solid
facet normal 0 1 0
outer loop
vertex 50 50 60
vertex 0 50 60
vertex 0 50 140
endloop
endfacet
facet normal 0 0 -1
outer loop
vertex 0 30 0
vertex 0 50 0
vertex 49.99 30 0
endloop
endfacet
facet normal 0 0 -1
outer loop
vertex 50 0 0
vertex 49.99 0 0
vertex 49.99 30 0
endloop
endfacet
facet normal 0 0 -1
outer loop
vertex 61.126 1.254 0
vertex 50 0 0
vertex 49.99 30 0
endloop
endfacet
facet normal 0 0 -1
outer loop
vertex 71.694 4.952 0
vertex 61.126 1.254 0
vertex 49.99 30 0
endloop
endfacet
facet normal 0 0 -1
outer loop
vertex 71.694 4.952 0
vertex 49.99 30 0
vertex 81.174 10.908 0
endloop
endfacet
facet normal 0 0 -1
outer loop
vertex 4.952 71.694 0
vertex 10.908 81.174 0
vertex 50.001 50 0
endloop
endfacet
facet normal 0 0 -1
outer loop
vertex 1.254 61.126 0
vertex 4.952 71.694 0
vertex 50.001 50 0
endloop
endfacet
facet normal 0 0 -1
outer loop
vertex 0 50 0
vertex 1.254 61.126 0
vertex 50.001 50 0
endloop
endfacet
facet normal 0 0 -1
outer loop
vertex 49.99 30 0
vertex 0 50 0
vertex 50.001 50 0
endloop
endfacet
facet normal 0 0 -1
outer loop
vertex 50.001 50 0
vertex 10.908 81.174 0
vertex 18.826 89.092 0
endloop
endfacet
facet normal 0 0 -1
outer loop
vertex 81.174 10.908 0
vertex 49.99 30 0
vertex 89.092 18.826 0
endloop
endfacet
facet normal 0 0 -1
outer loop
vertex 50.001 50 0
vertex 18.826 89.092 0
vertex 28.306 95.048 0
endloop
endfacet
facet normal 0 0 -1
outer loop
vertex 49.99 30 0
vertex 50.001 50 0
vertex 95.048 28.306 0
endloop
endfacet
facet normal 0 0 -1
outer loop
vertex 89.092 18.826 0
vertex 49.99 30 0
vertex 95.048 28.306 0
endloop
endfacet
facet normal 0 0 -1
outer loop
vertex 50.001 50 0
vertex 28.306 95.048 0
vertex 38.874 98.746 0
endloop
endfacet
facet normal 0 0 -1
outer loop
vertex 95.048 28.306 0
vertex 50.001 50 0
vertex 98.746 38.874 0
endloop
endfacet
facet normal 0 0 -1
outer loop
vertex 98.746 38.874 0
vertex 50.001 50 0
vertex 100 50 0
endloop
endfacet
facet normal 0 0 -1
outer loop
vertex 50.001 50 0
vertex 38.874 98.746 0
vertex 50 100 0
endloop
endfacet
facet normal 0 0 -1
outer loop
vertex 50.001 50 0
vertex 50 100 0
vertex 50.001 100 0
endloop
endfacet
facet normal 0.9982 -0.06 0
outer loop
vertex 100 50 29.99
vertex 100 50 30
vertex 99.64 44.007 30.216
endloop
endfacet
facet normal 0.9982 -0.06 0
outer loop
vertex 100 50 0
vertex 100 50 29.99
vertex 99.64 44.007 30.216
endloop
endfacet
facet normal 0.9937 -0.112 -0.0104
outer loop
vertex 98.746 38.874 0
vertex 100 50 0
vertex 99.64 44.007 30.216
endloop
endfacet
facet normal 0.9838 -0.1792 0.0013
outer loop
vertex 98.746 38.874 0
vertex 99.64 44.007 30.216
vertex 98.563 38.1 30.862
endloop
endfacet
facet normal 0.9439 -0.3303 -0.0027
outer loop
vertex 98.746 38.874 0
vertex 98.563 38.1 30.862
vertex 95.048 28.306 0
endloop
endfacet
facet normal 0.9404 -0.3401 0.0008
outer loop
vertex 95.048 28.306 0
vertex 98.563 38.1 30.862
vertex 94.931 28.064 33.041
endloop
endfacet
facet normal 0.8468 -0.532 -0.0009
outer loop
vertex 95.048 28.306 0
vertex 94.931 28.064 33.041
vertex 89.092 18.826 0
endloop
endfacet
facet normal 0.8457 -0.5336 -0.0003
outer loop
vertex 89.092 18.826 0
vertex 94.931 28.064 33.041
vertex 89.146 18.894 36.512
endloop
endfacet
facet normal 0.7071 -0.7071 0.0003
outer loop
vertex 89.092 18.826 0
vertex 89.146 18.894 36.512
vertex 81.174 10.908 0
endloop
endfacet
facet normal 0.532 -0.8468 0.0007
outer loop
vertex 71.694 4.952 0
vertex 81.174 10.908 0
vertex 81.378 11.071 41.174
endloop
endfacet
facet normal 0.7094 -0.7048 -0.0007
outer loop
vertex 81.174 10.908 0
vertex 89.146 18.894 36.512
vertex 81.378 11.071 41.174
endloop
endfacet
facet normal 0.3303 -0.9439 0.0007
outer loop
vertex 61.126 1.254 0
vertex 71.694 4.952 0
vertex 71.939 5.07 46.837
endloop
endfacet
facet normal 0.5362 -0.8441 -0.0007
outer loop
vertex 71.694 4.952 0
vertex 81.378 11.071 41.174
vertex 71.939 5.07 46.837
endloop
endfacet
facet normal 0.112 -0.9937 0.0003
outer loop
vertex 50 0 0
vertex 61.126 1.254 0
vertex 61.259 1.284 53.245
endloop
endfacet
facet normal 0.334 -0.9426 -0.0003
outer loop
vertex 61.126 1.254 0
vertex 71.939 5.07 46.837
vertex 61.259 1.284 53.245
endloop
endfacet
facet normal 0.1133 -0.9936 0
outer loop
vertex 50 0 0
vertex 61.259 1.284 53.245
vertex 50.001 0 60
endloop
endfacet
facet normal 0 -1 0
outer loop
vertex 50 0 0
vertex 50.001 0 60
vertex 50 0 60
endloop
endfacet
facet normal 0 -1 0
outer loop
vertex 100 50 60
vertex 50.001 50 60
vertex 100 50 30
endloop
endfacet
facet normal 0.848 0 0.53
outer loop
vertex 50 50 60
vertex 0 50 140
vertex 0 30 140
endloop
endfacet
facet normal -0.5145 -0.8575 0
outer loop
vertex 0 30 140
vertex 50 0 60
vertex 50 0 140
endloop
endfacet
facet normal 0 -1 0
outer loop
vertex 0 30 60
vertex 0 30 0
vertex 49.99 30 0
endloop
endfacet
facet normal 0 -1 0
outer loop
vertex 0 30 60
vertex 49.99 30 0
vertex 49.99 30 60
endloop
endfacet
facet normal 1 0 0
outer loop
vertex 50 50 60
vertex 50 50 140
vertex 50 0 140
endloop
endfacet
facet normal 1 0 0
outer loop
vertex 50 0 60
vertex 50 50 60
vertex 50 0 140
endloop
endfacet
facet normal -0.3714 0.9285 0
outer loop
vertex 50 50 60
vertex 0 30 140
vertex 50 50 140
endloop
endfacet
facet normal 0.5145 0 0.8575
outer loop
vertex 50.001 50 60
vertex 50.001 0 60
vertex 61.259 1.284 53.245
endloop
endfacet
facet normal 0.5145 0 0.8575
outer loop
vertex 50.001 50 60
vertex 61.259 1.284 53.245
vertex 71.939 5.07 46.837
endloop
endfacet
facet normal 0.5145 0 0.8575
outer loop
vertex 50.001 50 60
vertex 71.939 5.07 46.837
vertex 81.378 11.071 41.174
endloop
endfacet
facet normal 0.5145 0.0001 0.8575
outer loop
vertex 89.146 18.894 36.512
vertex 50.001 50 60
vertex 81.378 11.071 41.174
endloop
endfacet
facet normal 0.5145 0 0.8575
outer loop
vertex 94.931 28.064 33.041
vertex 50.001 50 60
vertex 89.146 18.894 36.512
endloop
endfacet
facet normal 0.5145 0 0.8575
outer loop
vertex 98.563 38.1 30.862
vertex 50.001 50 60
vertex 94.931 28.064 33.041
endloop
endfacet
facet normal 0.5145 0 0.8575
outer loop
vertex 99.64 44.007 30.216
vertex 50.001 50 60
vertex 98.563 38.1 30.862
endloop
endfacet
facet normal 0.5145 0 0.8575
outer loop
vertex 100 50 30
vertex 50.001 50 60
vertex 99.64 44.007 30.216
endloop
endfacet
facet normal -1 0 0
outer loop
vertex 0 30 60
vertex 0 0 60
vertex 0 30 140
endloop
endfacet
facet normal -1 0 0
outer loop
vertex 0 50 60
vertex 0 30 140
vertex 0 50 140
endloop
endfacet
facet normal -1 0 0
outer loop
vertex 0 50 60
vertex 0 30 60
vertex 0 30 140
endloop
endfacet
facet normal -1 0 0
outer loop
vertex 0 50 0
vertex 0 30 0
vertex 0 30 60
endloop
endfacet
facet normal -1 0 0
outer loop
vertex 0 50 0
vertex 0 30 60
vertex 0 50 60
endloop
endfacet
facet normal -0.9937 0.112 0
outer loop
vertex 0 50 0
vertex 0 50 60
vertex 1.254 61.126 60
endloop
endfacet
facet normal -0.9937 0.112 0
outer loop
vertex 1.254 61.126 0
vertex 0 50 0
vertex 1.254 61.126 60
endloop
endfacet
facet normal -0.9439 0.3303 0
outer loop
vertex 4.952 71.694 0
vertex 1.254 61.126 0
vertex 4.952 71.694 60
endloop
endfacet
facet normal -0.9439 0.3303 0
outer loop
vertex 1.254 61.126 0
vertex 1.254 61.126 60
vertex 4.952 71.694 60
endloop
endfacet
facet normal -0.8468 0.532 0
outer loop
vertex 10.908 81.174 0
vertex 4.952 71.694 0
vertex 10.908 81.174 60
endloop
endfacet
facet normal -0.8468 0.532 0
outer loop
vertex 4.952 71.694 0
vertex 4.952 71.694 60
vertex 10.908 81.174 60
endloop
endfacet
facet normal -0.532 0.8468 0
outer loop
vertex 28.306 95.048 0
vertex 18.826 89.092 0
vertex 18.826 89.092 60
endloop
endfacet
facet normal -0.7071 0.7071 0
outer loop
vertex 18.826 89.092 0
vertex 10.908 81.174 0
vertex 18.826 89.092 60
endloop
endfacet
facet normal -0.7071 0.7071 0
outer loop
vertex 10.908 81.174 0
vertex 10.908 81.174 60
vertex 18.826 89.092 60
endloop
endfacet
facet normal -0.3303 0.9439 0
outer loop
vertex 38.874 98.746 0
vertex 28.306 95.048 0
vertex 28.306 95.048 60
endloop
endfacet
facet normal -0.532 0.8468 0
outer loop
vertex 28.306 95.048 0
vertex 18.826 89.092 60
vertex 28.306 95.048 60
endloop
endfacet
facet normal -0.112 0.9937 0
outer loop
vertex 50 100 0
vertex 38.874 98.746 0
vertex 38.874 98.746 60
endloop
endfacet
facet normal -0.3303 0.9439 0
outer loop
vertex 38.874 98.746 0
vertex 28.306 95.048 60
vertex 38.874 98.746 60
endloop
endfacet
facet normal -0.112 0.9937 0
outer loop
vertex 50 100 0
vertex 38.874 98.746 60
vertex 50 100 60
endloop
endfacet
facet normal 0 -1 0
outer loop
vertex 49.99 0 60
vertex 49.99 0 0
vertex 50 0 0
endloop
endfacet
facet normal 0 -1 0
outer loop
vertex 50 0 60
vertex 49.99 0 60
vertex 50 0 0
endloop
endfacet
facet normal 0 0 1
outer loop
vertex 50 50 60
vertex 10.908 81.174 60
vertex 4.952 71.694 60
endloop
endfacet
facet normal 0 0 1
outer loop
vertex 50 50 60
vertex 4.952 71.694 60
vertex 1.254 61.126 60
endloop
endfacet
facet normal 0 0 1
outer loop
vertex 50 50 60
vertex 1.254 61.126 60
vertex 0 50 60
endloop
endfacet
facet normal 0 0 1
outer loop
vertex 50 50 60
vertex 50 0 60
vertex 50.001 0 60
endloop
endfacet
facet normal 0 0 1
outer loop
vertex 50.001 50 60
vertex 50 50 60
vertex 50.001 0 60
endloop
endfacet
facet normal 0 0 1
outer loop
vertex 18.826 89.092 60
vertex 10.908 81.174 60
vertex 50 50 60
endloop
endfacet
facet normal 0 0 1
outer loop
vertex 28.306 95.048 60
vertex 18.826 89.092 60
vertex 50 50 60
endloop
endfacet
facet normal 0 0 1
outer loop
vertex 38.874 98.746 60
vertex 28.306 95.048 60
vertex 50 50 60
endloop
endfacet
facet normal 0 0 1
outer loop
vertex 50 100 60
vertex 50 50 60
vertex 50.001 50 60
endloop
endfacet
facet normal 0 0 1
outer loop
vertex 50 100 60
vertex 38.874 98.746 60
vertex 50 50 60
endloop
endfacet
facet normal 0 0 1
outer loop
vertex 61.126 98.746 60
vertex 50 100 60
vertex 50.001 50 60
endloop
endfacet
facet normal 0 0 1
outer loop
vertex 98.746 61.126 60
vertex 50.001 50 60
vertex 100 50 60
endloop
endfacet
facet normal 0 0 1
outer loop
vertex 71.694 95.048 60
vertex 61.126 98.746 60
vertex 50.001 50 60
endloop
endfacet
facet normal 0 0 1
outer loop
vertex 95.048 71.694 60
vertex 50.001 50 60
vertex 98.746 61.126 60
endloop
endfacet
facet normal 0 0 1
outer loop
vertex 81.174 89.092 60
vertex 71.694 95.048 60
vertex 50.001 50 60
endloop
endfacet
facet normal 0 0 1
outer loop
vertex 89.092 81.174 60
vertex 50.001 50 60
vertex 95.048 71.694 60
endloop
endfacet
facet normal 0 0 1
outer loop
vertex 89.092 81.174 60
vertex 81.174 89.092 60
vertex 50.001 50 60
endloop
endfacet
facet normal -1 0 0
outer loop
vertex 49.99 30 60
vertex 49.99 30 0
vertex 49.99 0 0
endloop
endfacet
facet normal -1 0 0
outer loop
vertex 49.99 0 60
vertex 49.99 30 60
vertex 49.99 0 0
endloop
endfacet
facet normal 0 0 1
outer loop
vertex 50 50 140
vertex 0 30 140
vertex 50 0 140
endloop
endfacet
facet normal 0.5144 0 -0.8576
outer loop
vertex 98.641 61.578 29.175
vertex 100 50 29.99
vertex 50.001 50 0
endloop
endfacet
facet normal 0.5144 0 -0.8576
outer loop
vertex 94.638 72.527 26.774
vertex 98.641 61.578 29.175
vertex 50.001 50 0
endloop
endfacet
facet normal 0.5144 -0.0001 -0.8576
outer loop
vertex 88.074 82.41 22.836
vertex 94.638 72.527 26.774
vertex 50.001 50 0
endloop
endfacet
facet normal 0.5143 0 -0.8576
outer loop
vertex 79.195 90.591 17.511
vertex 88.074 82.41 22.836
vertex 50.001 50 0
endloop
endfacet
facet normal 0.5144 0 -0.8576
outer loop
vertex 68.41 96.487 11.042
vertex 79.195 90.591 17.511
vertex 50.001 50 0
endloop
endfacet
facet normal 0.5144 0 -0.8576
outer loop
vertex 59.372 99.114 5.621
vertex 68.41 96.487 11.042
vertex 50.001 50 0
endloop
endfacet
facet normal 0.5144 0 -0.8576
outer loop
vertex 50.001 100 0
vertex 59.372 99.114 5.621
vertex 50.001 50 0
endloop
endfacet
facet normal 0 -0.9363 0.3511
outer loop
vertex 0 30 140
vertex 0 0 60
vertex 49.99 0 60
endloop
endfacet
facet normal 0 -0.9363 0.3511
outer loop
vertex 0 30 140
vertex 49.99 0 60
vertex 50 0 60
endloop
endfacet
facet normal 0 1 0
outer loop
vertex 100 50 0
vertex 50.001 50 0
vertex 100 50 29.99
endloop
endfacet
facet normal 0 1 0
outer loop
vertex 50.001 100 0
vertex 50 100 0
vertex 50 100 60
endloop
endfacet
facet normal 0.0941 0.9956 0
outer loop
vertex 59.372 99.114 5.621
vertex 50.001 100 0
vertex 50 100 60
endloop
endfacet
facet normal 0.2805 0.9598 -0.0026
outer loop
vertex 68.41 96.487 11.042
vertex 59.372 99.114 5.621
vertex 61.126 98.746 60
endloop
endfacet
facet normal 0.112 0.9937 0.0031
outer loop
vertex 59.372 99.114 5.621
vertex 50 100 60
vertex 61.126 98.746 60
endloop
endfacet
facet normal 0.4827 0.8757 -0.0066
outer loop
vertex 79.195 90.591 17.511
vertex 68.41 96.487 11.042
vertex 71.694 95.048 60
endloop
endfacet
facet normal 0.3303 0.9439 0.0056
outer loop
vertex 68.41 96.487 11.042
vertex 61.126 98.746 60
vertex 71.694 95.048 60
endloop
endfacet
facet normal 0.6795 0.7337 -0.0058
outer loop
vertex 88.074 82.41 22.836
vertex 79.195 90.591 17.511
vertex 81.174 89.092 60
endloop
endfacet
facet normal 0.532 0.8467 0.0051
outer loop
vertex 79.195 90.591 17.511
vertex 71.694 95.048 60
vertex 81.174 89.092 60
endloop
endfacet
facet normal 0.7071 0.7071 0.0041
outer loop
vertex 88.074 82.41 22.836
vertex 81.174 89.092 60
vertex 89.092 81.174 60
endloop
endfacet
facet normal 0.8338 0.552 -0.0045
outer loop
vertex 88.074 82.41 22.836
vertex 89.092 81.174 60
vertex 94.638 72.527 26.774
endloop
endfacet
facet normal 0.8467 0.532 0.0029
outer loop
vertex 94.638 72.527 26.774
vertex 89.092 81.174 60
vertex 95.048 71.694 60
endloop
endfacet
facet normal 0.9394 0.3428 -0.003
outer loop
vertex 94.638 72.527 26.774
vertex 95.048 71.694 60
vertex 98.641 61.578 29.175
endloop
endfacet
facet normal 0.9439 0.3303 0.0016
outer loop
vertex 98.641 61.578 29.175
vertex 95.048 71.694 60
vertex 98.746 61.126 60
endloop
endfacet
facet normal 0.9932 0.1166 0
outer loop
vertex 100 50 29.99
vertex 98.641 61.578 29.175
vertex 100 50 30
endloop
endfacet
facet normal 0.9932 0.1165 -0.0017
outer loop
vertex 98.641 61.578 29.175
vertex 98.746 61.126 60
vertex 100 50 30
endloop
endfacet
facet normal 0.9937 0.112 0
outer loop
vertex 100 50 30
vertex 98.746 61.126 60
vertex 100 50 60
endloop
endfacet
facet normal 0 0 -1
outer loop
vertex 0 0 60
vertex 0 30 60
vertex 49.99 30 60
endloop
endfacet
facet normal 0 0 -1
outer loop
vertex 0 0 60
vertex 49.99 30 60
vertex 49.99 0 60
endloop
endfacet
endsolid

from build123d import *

# Parameters (mm, degrees)
F0_W      = 100
F0_H      = 100
F1_DEPTH  = 140
F3_DEPTH  = 140.001
F5_DEPTH  = 80
F9_DEPTH  = 50.00099999
F11_DEPTH = 50.00099999
F6_W      = 50
F6_H      = 80
F14_W     = 30
F14_H     = 60
F16_DEPTH = 49.99


with BuildPart() as f1:
    # F0 (on Top) → F1 (new body)
    with BuildSketch(Plane.XY):
        with Locations((50, 50)):
            Rectangle(F0_W, F0_H)
    extrude(amount=F1_DEPTH)

    # F2 (on face) → F3 (cut, through all)
    with BuildSketch(Plane.XY.offset(140)):
        with BuildLine():
            ThreePointArc((0, 50), (14.6446609407, 85.3553390593), (50, 100))
            Line((50, 100), (0, 100))
            Line((0, 100), (0, 50))
        make_face()
        with BuildLine():
            ThreePointArc((50, 100), (85.3553390593, 85.3553390593), (100, 50))
            Line((100, 50), (100, 100))
            Line((100, 100), (50, 100))
        make_face()
        with BuildLine():
            Line((100, 0), (100, 50))
            ThreePointArc((100, 50), (85.3553390593, 14.6446609407), (50, 0))
            Line((50, 0), (100, 0))
        make_face()
    extrude(amount=-F3_DEPTH, mode=Mode.SUBTRACT)

    # F4 (on face) → F5 (cut)
    with BuildSketch(Plane.XY.offset(140)):
        with BuildLine():
            ThreePointArc((100, 50), (50, 100), (0, 50))
            Line((0, 50), (50, 50))
            Line((50, 50), (50, 0))
            ThreePointArc((50, 0), (85.3553390593, 14.6446609407), (100, 50))
        make_face()
    extrude(amount=-F5_DEPTH, mode=Mode.SUBTRACT)

    # F8 (on face) → F9 (cut, through all)
    with BuildSketch(Plane.XZ.offset(-50)):
        Polygon((100, 60), (50.001, 60), (100, 30), align=None)
    extrude(amount=F9_DEPTH, mode=Mode.SUBTRACT)

    # F10 (on face) → F11 (cut, through all)
    with BuildSketch(Plane.XZ.offset(-50)):
        Polygon((50.001, 0), (100, 0), (100, 29.99), align=None)
    extrude(amount=-F11_DEPTH, mode=Mode.SUBTRACT)

    # F6 (on face) → F13 section 0
    with BuildSketch(Plane.XZ, mode=Mode.PRIVATE) as f13_s0:
        with Locations((25, 100)):
            Rectangle(F6_W, F6_H)
    loft([f13_s0.sketch, Vertex(0, 30, 140)], mode=Mode.SUBTRACT)

    # F14 (on face) → F16 (cut)
    with BuildSketch(Plane(origin=(0, 0, 0), x_dir=(0, -1, 0), z_dir=(-1, 0, 0))):
        with Locations((-15, 30)):
            Rectangle(F14_W, F14_H)
    extrude(amount=-F16_DEPTH, mode=Mode.SUBTRACT)

    # F17 (on face) → F18 section 0
    with BuildSketch(Plane.XY.offset(140), mode=Mode.PRIVATE) as f18_s0:
        Polygon((0, 50), (0, 30), (50, 50), align=None)
    loft([f18_s0.sketch, Vertex(50, 50, 60)], mode=Mode.SUBTRACT)


solid = f1.part
